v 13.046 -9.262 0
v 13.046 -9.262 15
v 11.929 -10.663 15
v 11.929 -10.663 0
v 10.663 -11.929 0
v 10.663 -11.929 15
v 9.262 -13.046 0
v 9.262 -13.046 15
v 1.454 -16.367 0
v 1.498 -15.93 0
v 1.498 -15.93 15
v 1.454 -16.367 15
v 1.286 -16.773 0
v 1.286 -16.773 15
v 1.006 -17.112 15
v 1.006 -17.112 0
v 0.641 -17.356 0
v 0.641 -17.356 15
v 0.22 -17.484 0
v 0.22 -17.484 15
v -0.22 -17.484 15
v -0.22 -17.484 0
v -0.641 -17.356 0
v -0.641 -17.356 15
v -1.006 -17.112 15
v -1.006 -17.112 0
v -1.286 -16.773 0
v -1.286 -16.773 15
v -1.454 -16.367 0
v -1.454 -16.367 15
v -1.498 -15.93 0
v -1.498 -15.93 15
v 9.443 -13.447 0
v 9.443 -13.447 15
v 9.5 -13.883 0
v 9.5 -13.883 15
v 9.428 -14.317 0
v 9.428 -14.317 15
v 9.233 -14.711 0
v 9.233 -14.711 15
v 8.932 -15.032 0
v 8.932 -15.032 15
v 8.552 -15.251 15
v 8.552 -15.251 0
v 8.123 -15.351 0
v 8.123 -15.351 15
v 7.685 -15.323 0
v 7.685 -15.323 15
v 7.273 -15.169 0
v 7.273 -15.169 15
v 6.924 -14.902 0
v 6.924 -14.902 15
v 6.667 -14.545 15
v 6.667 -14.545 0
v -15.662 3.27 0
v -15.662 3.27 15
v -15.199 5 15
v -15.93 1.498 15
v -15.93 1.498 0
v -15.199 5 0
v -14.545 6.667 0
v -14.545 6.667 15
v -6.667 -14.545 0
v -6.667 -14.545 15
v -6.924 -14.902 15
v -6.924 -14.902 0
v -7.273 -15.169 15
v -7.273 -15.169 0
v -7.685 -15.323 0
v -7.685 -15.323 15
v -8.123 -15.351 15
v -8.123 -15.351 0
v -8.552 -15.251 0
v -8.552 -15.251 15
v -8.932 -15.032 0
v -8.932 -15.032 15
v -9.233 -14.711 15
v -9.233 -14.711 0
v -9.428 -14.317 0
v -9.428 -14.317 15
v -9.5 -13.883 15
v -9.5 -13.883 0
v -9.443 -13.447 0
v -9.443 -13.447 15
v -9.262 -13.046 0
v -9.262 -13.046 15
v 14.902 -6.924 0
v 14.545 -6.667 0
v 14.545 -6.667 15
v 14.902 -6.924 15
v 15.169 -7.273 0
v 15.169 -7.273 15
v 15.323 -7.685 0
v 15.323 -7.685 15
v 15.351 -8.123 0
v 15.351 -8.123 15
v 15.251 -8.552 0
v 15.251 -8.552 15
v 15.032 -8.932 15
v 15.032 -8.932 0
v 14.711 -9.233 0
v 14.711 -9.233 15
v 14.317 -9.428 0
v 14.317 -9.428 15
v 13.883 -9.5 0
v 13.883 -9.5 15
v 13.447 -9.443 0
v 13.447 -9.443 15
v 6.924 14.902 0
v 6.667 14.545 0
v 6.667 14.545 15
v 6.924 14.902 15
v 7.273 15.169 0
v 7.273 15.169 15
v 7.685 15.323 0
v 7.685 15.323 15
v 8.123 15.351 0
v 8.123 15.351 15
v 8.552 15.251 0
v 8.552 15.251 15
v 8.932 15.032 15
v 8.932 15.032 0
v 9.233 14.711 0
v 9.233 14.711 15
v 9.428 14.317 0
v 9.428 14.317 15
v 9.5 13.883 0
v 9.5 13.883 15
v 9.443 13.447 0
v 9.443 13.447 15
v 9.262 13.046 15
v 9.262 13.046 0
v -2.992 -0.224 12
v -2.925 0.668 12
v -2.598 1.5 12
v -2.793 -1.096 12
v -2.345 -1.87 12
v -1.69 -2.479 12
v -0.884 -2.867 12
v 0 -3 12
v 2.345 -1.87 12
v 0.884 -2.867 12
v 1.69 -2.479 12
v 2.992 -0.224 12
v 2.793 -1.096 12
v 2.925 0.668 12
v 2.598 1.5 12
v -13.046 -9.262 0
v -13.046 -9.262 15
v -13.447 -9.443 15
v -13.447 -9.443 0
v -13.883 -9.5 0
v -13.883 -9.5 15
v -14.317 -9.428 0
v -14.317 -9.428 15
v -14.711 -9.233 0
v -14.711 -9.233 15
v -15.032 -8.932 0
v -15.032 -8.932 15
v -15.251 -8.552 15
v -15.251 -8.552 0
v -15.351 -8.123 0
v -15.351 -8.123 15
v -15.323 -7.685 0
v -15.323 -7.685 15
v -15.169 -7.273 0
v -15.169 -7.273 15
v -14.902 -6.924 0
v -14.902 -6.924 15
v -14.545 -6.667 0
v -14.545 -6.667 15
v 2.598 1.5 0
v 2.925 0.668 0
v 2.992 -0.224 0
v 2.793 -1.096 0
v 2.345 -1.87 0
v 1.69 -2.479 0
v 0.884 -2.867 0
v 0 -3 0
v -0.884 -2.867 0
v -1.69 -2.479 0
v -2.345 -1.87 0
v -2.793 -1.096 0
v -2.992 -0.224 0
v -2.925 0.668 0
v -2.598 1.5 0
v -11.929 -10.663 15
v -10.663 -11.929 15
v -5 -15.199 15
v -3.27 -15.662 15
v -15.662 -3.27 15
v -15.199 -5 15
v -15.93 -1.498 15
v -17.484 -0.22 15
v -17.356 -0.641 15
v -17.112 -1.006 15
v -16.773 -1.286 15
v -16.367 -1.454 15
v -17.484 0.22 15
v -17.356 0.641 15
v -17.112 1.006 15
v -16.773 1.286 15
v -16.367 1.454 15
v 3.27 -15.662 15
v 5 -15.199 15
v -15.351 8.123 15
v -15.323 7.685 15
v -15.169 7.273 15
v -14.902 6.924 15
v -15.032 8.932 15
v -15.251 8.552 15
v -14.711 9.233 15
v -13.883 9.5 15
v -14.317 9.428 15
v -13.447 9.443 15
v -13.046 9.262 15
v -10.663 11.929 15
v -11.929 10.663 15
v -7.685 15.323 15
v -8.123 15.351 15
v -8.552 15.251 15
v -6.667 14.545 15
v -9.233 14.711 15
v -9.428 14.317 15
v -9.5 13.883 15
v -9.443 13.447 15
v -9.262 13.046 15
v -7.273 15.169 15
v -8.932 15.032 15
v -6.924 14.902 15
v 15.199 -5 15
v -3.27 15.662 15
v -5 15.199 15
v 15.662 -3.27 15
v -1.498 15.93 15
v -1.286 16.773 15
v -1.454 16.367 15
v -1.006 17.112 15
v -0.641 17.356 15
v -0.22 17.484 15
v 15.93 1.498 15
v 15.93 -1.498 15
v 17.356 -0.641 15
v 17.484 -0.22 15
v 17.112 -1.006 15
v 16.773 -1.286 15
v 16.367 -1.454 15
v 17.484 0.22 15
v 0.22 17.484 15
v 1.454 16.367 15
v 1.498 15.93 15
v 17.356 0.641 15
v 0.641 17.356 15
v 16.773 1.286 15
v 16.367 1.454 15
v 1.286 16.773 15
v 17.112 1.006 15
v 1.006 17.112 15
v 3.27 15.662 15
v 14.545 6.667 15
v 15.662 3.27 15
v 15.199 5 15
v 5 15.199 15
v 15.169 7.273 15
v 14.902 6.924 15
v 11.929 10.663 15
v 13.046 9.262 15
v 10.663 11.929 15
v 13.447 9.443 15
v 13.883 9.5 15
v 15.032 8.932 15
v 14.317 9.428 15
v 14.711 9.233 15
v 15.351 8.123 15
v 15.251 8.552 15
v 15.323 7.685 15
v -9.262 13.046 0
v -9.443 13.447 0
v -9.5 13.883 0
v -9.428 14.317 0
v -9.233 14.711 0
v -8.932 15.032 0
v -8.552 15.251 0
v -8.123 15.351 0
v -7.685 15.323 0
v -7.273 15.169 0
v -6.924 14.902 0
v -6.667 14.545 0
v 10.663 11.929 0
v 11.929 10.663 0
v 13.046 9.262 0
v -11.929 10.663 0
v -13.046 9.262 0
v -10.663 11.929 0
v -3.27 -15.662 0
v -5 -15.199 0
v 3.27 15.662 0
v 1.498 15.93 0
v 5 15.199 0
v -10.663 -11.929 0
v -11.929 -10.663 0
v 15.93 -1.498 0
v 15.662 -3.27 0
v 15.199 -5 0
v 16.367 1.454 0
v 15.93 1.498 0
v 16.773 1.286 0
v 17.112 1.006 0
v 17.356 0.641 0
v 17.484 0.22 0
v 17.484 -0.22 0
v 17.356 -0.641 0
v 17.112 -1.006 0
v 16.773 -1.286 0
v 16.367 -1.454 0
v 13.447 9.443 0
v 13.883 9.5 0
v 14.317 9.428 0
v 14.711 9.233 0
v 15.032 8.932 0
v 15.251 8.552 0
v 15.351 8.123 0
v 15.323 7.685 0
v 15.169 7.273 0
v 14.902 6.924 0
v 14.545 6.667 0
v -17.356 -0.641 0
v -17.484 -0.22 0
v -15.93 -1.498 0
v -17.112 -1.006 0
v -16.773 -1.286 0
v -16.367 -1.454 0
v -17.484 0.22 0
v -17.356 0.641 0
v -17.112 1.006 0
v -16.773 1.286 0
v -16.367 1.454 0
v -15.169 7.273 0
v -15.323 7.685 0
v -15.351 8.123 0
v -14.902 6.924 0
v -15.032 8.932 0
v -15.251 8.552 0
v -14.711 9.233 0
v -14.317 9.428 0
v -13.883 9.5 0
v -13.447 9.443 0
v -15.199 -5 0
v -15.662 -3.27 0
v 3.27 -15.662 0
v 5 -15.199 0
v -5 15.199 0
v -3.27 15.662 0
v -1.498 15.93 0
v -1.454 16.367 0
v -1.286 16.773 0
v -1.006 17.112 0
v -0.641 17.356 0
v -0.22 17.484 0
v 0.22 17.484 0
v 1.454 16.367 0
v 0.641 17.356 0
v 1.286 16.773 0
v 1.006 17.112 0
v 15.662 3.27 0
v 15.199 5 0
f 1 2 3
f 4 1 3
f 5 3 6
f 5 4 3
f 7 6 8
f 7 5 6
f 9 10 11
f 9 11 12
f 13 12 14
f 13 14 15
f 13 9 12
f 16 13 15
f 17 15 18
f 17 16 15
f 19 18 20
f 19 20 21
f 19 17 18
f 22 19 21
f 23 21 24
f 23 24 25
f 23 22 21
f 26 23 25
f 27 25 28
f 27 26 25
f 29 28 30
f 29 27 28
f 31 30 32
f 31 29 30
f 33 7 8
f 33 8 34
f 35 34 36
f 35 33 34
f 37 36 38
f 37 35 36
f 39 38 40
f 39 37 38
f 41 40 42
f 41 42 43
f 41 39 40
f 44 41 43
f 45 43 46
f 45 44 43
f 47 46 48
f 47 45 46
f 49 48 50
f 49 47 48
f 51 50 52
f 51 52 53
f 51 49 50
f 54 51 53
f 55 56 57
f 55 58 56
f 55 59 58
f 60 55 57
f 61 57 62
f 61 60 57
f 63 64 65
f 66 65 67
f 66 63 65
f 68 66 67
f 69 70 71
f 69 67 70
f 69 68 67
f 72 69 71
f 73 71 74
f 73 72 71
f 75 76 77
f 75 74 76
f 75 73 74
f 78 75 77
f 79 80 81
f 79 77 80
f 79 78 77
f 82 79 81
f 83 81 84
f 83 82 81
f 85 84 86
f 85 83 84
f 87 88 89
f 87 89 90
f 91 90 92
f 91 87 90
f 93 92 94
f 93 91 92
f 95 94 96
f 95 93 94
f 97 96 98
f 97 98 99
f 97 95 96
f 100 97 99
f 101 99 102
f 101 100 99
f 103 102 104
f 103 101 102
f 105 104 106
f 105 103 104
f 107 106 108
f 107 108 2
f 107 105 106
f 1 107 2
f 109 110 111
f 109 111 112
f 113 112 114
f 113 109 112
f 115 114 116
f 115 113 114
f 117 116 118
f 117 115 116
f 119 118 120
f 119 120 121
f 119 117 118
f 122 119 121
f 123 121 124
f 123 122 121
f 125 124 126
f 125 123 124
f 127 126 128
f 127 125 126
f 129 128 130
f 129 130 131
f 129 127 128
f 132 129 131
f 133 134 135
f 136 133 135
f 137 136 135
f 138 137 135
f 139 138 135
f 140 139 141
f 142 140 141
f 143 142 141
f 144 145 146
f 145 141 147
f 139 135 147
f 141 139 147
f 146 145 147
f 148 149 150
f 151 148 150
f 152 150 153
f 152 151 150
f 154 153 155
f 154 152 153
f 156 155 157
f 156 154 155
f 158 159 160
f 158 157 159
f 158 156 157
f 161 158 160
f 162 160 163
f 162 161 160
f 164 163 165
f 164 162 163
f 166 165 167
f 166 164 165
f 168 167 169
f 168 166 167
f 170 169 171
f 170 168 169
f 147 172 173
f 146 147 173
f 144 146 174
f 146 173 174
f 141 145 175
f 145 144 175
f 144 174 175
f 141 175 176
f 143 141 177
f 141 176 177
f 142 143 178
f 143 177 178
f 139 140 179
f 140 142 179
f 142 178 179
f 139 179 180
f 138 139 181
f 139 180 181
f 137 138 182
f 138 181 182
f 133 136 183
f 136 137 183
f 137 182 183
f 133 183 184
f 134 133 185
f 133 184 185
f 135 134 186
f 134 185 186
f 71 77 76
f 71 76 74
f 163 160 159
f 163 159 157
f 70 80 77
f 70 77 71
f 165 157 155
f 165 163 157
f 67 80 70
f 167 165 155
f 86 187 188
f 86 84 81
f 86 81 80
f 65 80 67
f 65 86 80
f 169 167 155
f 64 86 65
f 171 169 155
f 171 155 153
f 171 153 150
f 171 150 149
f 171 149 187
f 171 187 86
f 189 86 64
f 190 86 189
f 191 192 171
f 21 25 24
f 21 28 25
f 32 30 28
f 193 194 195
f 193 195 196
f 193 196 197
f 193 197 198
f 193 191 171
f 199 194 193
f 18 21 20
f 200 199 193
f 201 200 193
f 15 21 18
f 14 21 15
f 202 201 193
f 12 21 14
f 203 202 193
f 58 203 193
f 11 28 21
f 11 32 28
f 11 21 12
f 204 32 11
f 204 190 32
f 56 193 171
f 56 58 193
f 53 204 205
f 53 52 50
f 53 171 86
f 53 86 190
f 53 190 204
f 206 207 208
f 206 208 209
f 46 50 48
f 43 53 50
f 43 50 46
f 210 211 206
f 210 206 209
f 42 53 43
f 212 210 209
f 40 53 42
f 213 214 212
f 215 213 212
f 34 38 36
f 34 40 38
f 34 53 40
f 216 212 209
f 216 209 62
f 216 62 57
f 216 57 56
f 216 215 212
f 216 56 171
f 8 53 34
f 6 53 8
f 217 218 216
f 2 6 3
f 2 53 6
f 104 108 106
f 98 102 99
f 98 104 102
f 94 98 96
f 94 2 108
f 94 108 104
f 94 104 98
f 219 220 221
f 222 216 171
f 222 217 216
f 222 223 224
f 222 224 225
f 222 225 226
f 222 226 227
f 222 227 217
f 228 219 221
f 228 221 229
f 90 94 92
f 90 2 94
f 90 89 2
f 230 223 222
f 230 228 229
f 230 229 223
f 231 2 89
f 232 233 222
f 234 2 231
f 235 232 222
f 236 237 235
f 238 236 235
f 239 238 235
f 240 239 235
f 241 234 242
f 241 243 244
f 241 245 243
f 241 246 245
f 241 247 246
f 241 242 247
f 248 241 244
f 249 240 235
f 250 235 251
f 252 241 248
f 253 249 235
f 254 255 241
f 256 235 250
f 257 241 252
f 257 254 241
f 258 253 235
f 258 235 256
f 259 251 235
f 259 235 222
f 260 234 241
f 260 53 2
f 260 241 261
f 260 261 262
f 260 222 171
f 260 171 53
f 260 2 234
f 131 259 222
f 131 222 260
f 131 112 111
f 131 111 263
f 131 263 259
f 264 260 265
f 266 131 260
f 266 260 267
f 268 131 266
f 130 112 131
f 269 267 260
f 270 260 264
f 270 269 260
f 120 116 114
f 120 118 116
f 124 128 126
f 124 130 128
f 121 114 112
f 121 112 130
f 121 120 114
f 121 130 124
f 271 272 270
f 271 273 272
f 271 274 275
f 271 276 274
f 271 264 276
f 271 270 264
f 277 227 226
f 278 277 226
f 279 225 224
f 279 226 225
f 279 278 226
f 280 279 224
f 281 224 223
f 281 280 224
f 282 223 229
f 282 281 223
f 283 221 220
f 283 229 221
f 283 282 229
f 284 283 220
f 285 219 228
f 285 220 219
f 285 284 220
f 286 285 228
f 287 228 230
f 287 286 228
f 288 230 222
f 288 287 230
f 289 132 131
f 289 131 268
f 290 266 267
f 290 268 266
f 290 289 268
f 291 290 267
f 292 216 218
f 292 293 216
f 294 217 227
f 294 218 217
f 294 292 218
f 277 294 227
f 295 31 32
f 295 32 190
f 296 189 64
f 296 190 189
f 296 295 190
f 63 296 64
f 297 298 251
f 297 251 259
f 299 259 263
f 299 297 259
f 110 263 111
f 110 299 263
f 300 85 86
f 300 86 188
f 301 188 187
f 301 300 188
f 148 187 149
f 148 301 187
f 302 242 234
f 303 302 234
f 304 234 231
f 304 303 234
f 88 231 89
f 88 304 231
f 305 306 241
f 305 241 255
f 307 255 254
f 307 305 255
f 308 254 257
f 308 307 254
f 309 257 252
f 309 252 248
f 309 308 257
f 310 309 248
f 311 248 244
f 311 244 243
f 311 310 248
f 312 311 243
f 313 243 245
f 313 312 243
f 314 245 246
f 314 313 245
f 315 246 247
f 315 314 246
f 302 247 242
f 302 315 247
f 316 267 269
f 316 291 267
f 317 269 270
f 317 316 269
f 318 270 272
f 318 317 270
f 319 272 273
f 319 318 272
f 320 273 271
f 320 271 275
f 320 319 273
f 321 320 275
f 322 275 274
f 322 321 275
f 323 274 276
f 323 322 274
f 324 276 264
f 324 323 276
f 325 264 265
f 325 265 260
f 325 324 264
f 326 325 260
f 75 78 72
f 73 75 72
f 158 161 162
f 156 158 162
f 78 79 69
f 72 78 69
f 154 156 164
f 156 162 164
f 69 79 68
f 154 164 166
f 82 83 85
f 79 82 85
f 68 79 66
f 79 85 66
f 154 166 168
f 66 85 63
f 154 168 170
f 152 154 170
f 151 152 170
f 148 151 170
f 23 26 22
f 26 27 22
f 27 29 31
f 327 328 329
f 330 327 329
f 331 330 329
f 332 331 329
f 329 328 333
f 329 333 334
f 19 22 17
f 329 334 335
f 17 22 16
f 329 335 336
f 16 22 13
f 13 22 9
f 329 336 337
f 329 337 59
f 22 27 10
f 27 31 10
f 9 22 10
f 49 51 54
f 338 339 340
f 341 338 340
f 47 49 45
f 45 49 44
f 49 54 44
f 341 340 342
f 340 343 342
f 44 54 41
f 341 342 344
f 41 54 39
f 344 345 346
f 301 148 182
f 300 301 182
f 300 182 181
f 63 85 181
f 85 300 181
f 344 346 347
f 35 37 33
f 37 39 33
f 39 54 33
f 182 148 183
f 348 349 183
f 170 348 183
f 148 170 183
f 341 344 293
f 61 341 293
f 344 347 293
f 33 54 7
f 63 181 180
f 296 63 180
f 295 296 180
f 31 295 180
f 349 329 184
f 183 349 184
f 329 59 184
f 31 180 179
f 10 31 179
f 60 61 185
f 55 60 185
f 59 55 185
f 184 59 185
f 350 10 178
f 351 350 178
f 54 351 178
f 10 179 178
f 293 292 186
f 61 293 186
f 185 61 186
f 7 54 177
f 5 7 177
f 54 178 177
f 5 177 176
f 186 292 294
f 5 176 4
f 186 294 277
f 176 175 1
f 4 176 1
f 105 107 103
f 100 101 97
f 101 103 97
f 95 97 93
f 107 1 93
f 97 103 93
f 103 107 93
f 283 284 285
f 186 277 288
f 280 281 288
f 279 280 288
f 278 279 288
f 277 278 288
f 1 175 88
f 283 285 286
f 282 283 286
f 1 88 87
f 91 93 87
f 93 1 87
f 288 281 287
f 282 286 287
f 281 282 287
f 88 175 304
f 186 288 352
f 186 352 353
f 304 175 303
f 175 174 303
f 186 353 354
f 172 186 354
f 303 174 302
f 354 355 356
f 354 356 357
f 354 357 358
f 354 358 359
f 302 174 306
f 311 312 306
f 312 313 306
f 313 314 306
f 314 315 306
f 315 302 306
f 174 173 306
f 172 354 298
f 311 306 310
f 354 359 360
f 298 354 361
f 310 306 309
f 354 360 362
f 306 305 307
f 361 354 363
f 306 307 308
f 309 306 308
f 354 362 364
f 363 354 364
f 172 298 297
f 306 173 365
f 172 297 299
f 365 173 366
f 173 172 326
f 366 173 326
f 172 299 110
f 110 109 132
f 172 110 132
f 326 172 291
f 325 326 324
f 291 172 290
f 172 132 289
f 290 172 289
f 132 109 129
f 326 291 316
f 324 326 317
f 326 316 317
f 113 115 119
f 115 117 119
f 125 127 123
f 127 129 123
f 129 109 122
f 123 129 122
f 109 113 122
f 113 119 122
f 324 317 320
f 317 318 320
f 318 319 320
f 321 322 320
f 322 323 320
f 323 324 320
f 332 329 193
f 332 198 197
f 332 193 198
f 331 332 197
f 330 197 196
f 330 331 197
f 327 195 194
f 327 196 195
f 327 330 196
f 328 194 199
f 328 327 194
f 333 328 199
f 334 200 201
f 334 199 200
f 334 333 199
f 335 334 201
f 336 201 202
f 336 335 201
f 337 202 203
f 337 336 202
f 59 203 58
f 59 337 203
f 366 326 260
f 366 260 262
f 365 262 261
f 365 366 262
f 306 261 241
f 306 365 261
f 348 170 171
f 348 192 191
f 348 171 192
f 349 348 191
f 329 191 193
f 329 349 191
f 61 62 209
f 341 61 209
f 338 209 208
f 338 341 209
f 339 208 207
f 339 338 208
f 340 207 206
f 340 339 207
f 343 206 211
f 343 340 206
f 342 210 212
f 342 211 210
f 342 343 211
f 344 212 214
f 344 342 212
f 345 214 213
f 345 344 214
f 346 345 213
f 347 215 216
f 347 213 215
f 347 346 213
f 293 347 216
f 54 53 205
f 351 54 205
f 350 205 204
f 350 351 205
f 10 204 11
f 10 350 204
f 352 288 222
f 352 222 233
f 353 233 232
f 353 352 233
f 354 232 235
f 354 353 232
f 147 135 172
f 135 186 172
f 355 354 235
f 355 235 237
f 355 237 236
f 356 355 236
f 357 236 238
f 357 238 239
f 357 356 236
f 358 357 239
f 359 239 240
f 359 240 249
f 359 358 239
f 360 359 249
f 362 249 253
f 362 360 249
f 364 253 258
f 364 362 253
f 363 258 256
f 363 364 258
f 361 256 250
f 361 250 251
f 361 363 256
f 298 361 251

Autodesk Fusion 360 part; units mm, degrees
sketch "Sketch1" plane through (0, 0, 0) normal (0, 0, 1) x (1, 0, 0) in component "Knob"
  circle A0 centre (0, 0) radius 3
  line L0 (-2.5981, 1.5) -> (2.5981, 1.5)
  circle A1 centre (0, 0) radius 16
  circle A2 centre (0, 16) radius 1.5
  circle A3 centre (-8, 13.8564) radius 1.5
  circle A4 centre (-13.8564, 8) radius 1.5
  circle A5 centre (-16, 0) radius 1.5
  circle A6 centre (-13.8564, -8) radius 1.5
  circle A7 centre (-8, -13.8564) radius 1.5
  circle A8 centre (0, -16) radius 1.5
  circle A9 centre (8, -13.8564) radius 1.5
  circle A10 centre (13.8564, -8) radius 1.5
  circle A11 centre (16, 0) radius 1.5
  circle A12 centre (13.8564, 8) radius 1.5
  circle A13 centre (8, 13.8564) radius 1.5
  point P0 (0, -3)
  dimension "d1" = 6
  dimension "d3" = 4.5
  dimension "d4" = 32
  dimension "d5" = 3
  dimension "d7" = 360
extrude "Extrude1" add sketch "Sketch1" along normal blind 12 contours A0 L0 | A1 A11 | A1 A11 | A1 A2 A3 A4 A5 A6 A7 A8 A9 A10 A11 A12 A13 | A1 A12 | A1 A12 | A1 A10 | A1 A10 | A1 A13 | A1 A13 | A1 A9 | A1 A9 | A1 A2 | A1 A2 | A1 A8 | A1 A8 | A1 A3 | A1 A3 | A1 A7 | A1 A7 | A1 A4 | A1 A4 | A1 A6 | A1 A6 | A1 A5 | A1 A5 picked at (0.6802, 1.7331) in component "Knob"
extrude "Extrude2" add sketch "Sketch1" along normal blind 3 from surface at 12 contours A0 L0 | A0 L0 | A1 A11 | A1 A11 | A1 A2 A3 A4 A5 A6 A7 A8 A9 A10 A11 A12 A13 | A1 A12 | A1 A12 | A1 A10 | A1 A10 | A1 A13 | A1 A13 | A1 A9 | A1 A9 | A1 A2 | A1 A2 | A1 A8 | A1 A8 | A1 A3 | A1 A3 | A1 A7 | A1 A7 | A1 A4 | A1 A4 | A1 A6 | A1 A6 | A1 A5 | A1 A5 in component "Knob"
sketch "Sketch2" plane through (0, 0, 15) normal (0, 0, 1) x (-1, 0, 0) in component "Knob"
  arc A0 (-9.2625, -13.0463) -> (-6.6672, -14.5447) centre (-8, -13.8564) ccw
  arc A1 (-6.6672, -14.5447) -> (-1.4984, -15.9297) centre (0, 0) ccw
  arc A2 (-1.4984, -15.9297) -> (1.4984, -15.9297) centre (0, -16) ccw
  arc A3 (1.4984, -15.9297) -> (6.6672, -14.5447) centre (0, 0) ccw
  arc A4 (6.6672, -14.5447) -> (9.2625, -13.0463) centre (8, -13.8564) ccw
  arc A5 (9.2625, -13.0463) -> (13.0463, -9.2625) centre (0, 0) ccw
  arc A6 (13.0463, -9.2625) -> (14.5447, -6.6672) centre (13.8564, -8) ccw
  arc A7 (14.5447, -6.6672) -> (15.9297, -1.4984) centre (0, 0) ccw
  arc A8 (15.9297, -1.4984) -> (15.9297, 1.4984) centre (16, 0) ccw
  arc A9 (15.9297, 1.4984) -> (14.5447, 6.6672) centre (0, 0) ccw
  arc A10 (14.5447, 6.6672) -> (13.0463, 9.2625) centre (13.8564, 8) ccw
  arc A11 (13.0463, 9.2625) -> (9.2625, 13.0463) centre (0, 0) ccw
  arc A12 (9.2625, 13.0463) -> (6.6672, 14.5447) centre (8, 13.8564) ccw
  arc A13 (6.6672, 14.5447) -> (1.4984, 15.9297) centre (0, 0) ccw
  arc A14 (1.4984, 15.9297) -> (-1.4984, 15.9297) centre (0, 16) ccw
  arc A15 (-1.4984, 15.9297) -> (-6.6672, 14.5447) centre (0, 0) ccw
  arc A16 (-6.6672, 14.5447) -> (-9.2625, 13.0463) centre (-8, 13.8564) ccw
  arc A17 (-9.2625, 13.0463) -> (-13.0463, 9.2625) centre (0, 0) ccw
  arc A18 (-13.0463, 9.2625) -> (-14.5447, 6.6672) centre (-13.8564, 8) ccw
  arc A19 (-14.5447, 6.6672) -> (-15.9297, 1.4984) centre (0, 0) ccw
  arc A20 (-15.9297, 1.4984) -> (-15.9297, -1.4984) centre (-16, 0) ccw
  arc A21 (-15.9297, -1.4984) -> (-14.5447, -6.6672) centre (0, 0) ccw
  arc A22 (-14.5447, -6.6672) -> (-13.0463, -9.2625) centre (-13.8564, -8) ccw
  arc A23 (-13.0463, -9.2625) -> (-9.2625, -13.0463) centre (0, 0) ccw
  line L0 (0.5, -15) -> (-0.5, -15)
  line L1 (-0.5, -15) -> (-0.5, -4)
  line L2 (-0.5, -4) -> (0.5, -4)
  line L3 (0.5, -4) -> (0.5, -15)
  line L4 (1.567, -3.7141) -> (2.433, -3.2141)
  line L5 (2.433, -3.2141) -> (7.933, -12.7404)
  line L6 (7.067, -13.2404) -> (1.567, -3.7141)
  line L7 (7.933, -12.7404) -> (7.067, -13.2404)
  line L8 (3.2141, -2.433) -> (3.7141, -1.567)
  line L9 (3.7141, -1.567) -> (13.2404, -7.067)
  line L10 (12.7404, -7.933) -> (3.2141, -2.433)
  line L11 (13.2404, -7.067) -> (12.7404, -7.933)
  line L12 (4, -0.5) -> (4, 0.5)
  line L13 (4, 0.5) -> (15, 0.5)
  line L14 (15, -0.5) -> (4, -0.5)
  line L15 (15, 0.5) -> (15, -0.5)
  line L16 (3.7141, 1.567) -> (3.2141, 2.433)
  line L17 (3.2141, 2.433) -> (12.7404, 7.933)
  line L18 (13.2404, 7.067) -> (3.7141, 1.567)
  line L19 (12.7404, 7.933) -> (13.2404, 7.067)
  line L20 (2.433, 3.2141) -> (1.567, 3.7141)
  line L21 (1.567, 3.7141) -> (7.067, 13.2404)
  line L22 (7.933, 12.7404) -> (2.433, 3.2141)
  line L23 (7.067, 13.2404) -> (7.933, 12.7404)
  line L24 (0.5, 4) -> (-0.5, 4)
  line L25 (-0.5, 4) -> (-0.5, 15)
  line L26 (0.5, 15) -> (0.5, 4)
  line L27 (-0.5, 15) -> (0.5, 15)
  line L28 (-1.567, 3.7141) -> (-2.433, 3.2141)
  line L29 (-2.433, 3.2141) -> (-7.933, 12.7404)
  line L30 (-7.067, 13.2404) -> (-1.567, 3.7141)
  line L31 (-7.933, 12.7404) -> (-7.067, 13.2404)
  line L32 (-3.2141, 2.433) -> (-3.7141, 1.567)
  line L33 (-3.7141, 1.567) -> (-13.2404, 7.067)
  line L34 (-12.7404, 7.933) -> (-3.2141, 2.433)
  line L35 (-13.2404, 7.067) -> (-12.7404, 7.933)
  line L36 (-4, 0.5) -> (-4, -0.5)
  line L37 (-4, -0.5) -> (-15, -0.5)
  line L38 (-15, 0.5) -> (-4, 0.5)
  line L39 (-15, -0.5) -> (-15, 0.5)
  line L40 (-3.7141, -1.567) -> (-3.2141, -2.433)
  line L41 (-3.2141, -2.433) -> (-12.7404, -7.933)
  line L42 (-13.2404, -7.067) -> (-3.7141, -1.567)
  line L43 (-12.7404, -7.933) -> (-13.2404, -7.067)
  line L44 (-2.433, -3.2141) -> (-1.567, -3.7141)
  line L45 (-1.567, -3.7141) -> (-7.067, -13.2404)
  line L46 (-7.933, -12.7404) -> (-2.433, -3.2141)
  line L47 (-7.067, -13.2404) -> (-7.933, -12.7404)
  dimension "d18" = 11
  dimension "d19" = 1
  dimension "d20" = 0.5
  dimension "d21" = 4
  dimension "d23" = 360
component "Knob" placed x (1, 0, 0) y (0, 1, 0) z (0, 0, 1) at (0, 0, 0)
equation "d20 = d19 / 2"
